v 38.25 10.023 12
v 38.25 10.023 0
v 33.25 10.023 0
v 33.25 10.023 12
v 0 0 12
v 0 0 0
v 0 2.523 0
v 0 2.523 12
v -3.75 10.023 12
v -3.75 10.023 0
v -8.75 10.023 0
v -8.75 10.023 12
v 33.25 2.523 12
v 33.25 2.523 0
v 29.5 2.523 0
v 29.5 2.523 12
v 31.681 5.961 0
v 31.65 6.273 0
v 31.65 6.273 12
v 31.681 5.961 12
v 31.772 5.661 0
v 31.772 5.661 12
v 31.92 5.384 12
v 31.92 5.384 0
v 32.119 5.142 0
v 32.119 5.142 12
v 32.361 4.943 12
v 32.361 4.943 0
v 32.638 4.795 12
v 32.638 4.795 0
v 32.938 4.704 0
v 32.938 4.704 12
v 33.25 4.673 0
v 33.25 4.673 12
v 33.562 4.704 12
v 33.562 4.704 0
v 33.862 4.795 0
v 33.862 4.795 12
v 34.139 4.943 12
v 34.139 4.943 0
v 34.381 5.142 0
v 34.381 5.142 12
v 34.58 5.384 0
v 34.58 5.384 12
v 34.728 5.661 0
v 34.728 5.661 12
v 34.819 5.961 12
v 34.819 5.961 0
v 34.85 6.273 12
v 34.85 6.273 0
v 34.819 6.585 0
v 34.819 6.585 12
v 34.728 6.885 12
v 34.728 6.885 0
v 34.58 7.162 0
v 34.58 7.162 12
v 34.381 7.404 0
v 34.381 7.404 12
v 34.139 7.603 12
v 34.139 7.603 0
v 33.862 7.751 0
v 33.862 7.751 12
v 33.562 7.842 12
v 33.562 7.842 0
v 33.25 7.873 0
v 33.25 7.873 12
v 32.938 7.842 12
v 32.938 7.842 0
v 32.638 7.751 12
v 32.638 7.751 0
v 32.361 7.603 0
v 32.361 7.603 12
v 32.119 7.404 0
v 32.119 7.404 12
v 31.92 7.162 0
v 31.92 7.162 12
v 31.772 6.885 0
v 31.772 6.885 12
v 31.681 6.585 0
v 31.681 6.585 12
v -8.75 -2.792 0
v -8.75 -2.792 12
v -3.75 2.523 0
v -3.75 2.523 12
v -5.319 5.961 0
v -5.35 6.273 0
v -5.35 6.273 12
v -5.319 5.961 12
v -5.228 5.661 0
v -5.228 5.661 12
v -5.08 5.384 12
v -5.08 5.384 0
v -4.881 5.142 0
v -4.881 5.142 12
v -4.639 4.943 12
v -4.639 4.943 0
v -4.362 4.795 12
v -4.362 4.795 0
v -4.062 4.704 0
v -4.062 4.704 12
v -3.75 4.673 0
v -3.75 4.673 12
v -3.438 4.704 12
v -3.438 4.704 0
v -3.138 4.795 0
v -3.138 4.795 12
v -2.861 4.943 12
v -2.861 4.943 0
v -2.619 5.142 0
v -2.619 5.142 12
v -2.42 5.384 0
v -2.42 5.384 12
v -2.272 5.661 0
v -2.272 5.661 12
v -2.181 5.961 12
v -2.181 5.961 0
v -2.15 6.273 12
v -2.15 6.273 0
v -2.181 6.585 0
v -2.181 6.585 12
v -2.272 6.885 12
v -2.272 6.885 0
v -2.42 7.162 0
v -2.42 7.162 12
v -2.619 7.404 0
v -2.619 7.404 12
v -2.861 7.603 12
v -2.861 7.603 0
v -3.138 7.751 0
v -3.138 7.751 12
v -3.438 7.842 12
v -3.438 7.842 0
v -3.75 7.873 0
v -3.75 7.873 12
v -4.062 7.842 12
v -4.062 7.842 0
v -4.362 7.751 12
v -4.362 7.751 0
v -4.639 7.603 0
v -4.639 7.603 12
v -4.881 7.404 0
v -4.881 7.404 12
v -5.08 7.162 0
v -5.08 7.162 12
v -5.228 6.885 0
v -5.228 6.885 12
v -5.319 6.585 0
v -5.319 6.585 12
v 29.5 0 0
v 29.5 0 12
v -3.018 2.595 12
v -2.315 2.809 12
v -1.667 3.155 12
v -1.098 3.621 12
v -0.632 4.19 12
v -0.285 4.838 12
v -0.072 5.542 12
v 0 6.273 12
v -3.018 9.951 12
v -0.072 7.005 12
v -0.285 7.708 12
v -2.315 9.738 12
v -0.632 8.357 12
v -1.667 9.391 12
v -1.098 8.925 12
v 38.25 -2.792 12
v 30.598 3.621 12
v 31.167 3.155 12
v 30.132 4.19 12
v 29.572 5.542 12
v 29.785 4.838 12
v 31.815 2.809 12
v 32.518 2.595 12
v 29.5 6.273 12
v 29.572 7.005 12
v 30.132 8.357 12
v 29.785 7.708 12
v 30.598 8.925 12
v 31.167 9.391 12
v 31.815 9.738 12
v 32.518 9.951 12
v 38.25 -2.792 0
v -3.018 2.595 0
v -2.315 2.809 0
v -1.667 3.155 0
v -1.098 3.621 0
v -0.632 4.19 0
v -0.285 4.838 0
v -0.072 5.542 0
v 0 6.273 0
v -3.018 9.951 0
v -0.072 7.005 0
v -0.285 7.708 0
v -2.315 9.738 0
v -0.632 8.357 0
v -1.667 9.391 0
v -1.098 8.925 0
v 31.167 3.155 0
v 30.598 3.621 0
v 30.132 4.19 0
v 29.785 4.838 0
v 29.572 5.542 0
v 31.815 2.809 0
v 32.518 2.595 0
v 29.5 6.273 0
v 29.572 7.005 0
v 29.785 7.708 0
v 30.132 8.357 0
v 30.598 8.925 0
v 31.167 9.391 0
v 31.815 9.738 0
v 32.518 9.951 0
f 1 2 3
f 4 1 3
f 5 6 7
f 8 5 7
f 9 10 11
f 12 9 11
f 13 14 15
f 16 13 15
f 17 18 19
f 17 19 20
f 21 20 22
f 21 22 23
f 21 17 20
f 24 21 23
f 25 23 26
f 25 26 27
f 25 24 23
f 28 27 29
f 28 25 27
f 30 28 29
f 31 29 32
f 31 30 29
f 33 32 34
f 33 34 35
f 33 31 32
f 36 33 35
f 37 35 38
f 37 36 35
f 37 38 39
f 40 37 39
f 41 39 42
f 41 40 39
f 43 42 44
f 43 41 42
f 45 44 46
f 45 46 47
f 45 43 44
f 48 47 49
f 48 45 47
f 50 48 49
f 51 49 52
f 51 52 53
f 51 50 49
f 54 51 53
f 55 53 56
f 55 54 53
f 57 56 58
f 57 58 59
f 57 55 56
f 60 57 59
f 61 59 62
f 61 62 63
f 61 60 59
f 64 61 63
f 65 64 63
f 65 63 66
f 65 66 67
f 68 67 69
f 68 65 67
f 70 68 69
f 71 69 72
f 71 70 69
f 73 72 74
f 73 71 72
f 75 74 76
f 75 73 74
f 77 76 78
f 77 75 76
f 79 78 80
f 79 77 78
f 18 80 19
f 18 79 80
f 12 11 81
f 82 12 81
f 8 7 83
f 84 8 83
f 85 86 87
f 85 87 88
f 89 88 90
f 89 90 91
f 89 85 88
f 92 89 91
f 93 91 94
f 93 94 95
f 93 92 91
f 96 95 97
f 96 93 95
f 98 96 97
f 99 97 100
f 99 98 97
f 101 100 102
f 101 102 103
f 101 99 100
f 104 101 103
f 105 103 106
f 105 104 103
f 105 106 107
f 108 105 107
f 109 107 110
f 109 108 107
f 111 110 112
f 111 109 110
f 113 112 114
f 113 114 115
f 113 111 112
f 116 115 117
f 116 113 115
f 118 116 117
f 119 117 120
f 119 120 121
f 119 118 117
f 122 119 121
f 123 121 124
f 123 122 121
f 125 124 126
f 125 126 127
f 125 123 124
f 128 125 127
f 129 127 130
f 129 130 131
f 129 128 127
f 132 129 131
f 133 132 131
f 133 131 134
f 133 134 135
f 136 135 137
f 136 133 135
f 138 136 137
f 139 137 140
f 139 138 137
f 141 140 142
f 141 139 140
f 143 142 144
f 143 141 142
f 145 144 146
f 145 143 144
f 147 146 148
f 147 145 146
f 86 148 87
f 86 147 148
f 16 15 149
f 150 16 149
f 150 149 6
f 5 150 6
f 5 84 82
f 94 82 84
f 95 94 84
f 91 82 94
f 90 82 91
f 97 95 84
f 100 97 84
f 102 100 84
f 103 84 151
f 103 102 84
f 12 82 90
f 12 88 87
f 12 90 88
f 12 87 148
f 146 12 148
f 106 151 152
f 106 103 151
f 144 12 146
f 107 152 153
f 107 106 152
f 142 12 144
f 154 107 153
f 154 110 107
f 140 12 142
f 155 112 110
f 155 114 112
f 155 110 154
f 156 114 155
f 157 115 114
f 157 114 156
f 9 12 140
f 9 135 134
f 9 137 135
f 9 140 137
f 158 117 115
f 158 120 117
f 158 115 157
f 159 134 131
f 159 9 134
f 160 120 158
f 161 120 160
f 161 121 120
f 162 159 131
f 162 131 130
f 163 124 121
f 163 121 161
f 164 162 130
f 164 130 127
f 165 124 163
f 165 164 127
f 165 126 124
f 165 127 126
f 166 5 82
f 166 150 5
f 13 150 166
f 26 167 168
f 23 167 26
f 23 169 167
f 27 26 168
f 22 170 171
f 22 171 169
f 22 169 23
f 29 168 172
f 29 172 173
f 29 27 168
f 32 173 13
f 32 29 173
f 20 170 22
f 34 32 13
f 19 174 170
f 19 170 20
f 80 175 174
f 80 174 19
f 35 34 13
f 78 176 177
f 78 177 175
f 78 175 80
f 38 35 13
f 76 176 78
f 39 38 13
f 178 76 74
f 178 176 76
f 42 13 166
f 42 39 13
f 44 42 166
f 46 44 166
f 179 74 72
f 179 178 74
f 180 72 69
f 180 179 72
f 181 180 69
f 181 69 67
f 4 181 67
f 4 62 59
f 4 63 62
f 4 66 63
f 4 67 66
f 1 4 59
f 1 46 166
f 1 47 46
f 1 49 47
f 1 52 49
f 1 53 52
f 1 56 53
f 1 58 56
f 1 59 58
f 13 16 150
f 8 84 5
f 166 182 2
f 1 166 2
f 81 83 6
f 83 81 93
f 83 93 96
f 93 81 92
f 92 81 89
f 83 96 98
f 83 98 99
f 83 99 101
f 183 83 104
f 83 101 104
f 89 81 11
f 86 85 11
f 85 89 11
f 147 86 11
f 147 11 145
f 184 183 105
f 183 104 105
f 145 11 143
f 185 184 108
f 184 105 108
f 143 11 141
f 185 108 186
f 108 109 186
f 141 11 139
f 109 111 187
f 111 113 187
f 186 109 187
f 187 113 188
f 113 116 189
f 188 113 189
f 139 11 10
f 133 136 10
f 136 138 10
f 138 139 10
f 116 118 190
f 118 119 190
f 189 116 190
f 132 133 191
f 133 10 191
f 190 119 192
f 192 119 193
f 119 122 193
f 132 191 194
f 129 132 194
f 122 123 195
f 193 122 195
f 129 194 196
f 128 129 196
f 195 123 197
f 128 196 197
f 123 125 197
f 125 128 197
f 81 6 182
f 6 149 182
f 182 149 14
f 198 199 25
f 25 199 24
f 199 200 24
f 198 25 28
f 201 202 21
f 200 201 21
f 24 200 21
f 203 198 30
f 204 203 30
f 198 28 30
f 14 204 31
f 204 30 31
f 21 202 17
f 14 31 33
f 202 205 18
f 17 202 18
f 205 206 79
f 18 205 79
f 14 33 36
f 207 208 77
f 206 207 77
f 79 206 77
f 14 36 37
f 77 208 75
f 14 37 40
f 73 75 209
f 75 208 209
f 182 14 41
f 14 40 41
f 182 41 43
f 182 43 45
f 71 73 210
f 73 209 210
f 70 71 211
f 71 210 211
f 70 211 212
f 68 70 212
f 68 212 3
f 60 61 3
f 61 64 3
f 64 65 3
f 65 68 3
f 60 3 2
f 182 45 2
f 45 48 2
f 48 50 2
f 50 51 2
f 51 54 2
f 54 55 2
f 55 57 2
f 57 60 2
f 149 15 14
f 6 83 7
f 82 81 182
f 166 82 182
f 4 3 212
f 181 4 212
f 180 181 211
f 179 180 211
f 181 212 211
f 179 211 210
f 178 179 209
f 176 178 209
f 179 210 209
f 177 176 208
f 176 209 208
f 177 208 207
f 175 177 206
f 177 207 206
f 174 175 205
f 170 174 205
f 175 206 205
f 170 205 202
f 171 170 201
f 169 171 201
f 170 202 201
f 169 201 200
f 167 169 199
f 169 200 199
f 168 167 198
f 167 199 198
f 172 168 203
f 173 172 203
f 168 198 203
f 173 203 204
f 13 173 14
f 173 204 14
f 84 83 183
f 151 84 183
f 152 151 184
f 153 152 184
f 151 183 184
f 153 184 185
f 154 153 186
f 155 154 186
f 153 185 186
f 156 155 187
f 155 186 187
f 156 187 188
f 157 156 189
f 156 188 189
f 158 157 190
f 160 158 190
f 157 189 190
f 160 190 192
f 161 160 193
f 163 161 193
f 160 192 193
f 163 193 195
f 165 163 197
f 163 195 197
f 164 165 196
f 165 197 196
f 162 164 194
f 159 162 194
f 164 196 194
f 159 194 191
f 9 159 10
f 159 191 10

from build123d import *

# Parameters (mm, degrees)
SKETCH1_R           = 1.6
BOSS_EXTRUDE1_DEPTH = 12


with BuildPart() as part:
    # Sketch1 → Boss-Extrude1 (new body)
    with BuildSketch(Plane.XY):
        with BuildLine():
            ThreePointArc((-3.75, 2.523123532), (0, 6.273123532), (-3.75, 10.023123532))
            Line((-3.75, 10.023123532), (-8.75, 10.023123532))
            Line((-8.75, 10.023123532), (-8.75, -2.792382112))
            Line((-8.75, -2.792382112), (38.25, -2.792382112))
            Line((38.25, -2.792382112), (38.25, 10.023123532))
            Line((38.25, 10.023123532), (33.25, 10.023123532))
            ThreePointArc((33.25, 10.023123532), (29.5, 6.273123532), (33.25, 2.523123532))
            Line((33.25, 2.523123532), (29.5, 2.523123532))
            Line((29.5, 2.523123532), (29.5, 0))
            Line((29.5, 0), (0, 0))
            Line((0, 0), (0, 2.523123532))
            Line((0, 2.523123532), (-3.75, 2.523123532))
        make_face()
        with Locations(Location((-3.75, 6.273123532, 0), (0, 0, 180))):
            Circle(SKETCH1_R, mode=Mode.SUBTRACT)
        with Locations(Location((33.25, 6.273123532, 0), (0, 0, 180))):
            Circle(SKETCH1_R, mode=Mode.SUBTRACT)
    extrude(amount=BOSS_EXTRUDE1_DEPTH)


solid = part.part
